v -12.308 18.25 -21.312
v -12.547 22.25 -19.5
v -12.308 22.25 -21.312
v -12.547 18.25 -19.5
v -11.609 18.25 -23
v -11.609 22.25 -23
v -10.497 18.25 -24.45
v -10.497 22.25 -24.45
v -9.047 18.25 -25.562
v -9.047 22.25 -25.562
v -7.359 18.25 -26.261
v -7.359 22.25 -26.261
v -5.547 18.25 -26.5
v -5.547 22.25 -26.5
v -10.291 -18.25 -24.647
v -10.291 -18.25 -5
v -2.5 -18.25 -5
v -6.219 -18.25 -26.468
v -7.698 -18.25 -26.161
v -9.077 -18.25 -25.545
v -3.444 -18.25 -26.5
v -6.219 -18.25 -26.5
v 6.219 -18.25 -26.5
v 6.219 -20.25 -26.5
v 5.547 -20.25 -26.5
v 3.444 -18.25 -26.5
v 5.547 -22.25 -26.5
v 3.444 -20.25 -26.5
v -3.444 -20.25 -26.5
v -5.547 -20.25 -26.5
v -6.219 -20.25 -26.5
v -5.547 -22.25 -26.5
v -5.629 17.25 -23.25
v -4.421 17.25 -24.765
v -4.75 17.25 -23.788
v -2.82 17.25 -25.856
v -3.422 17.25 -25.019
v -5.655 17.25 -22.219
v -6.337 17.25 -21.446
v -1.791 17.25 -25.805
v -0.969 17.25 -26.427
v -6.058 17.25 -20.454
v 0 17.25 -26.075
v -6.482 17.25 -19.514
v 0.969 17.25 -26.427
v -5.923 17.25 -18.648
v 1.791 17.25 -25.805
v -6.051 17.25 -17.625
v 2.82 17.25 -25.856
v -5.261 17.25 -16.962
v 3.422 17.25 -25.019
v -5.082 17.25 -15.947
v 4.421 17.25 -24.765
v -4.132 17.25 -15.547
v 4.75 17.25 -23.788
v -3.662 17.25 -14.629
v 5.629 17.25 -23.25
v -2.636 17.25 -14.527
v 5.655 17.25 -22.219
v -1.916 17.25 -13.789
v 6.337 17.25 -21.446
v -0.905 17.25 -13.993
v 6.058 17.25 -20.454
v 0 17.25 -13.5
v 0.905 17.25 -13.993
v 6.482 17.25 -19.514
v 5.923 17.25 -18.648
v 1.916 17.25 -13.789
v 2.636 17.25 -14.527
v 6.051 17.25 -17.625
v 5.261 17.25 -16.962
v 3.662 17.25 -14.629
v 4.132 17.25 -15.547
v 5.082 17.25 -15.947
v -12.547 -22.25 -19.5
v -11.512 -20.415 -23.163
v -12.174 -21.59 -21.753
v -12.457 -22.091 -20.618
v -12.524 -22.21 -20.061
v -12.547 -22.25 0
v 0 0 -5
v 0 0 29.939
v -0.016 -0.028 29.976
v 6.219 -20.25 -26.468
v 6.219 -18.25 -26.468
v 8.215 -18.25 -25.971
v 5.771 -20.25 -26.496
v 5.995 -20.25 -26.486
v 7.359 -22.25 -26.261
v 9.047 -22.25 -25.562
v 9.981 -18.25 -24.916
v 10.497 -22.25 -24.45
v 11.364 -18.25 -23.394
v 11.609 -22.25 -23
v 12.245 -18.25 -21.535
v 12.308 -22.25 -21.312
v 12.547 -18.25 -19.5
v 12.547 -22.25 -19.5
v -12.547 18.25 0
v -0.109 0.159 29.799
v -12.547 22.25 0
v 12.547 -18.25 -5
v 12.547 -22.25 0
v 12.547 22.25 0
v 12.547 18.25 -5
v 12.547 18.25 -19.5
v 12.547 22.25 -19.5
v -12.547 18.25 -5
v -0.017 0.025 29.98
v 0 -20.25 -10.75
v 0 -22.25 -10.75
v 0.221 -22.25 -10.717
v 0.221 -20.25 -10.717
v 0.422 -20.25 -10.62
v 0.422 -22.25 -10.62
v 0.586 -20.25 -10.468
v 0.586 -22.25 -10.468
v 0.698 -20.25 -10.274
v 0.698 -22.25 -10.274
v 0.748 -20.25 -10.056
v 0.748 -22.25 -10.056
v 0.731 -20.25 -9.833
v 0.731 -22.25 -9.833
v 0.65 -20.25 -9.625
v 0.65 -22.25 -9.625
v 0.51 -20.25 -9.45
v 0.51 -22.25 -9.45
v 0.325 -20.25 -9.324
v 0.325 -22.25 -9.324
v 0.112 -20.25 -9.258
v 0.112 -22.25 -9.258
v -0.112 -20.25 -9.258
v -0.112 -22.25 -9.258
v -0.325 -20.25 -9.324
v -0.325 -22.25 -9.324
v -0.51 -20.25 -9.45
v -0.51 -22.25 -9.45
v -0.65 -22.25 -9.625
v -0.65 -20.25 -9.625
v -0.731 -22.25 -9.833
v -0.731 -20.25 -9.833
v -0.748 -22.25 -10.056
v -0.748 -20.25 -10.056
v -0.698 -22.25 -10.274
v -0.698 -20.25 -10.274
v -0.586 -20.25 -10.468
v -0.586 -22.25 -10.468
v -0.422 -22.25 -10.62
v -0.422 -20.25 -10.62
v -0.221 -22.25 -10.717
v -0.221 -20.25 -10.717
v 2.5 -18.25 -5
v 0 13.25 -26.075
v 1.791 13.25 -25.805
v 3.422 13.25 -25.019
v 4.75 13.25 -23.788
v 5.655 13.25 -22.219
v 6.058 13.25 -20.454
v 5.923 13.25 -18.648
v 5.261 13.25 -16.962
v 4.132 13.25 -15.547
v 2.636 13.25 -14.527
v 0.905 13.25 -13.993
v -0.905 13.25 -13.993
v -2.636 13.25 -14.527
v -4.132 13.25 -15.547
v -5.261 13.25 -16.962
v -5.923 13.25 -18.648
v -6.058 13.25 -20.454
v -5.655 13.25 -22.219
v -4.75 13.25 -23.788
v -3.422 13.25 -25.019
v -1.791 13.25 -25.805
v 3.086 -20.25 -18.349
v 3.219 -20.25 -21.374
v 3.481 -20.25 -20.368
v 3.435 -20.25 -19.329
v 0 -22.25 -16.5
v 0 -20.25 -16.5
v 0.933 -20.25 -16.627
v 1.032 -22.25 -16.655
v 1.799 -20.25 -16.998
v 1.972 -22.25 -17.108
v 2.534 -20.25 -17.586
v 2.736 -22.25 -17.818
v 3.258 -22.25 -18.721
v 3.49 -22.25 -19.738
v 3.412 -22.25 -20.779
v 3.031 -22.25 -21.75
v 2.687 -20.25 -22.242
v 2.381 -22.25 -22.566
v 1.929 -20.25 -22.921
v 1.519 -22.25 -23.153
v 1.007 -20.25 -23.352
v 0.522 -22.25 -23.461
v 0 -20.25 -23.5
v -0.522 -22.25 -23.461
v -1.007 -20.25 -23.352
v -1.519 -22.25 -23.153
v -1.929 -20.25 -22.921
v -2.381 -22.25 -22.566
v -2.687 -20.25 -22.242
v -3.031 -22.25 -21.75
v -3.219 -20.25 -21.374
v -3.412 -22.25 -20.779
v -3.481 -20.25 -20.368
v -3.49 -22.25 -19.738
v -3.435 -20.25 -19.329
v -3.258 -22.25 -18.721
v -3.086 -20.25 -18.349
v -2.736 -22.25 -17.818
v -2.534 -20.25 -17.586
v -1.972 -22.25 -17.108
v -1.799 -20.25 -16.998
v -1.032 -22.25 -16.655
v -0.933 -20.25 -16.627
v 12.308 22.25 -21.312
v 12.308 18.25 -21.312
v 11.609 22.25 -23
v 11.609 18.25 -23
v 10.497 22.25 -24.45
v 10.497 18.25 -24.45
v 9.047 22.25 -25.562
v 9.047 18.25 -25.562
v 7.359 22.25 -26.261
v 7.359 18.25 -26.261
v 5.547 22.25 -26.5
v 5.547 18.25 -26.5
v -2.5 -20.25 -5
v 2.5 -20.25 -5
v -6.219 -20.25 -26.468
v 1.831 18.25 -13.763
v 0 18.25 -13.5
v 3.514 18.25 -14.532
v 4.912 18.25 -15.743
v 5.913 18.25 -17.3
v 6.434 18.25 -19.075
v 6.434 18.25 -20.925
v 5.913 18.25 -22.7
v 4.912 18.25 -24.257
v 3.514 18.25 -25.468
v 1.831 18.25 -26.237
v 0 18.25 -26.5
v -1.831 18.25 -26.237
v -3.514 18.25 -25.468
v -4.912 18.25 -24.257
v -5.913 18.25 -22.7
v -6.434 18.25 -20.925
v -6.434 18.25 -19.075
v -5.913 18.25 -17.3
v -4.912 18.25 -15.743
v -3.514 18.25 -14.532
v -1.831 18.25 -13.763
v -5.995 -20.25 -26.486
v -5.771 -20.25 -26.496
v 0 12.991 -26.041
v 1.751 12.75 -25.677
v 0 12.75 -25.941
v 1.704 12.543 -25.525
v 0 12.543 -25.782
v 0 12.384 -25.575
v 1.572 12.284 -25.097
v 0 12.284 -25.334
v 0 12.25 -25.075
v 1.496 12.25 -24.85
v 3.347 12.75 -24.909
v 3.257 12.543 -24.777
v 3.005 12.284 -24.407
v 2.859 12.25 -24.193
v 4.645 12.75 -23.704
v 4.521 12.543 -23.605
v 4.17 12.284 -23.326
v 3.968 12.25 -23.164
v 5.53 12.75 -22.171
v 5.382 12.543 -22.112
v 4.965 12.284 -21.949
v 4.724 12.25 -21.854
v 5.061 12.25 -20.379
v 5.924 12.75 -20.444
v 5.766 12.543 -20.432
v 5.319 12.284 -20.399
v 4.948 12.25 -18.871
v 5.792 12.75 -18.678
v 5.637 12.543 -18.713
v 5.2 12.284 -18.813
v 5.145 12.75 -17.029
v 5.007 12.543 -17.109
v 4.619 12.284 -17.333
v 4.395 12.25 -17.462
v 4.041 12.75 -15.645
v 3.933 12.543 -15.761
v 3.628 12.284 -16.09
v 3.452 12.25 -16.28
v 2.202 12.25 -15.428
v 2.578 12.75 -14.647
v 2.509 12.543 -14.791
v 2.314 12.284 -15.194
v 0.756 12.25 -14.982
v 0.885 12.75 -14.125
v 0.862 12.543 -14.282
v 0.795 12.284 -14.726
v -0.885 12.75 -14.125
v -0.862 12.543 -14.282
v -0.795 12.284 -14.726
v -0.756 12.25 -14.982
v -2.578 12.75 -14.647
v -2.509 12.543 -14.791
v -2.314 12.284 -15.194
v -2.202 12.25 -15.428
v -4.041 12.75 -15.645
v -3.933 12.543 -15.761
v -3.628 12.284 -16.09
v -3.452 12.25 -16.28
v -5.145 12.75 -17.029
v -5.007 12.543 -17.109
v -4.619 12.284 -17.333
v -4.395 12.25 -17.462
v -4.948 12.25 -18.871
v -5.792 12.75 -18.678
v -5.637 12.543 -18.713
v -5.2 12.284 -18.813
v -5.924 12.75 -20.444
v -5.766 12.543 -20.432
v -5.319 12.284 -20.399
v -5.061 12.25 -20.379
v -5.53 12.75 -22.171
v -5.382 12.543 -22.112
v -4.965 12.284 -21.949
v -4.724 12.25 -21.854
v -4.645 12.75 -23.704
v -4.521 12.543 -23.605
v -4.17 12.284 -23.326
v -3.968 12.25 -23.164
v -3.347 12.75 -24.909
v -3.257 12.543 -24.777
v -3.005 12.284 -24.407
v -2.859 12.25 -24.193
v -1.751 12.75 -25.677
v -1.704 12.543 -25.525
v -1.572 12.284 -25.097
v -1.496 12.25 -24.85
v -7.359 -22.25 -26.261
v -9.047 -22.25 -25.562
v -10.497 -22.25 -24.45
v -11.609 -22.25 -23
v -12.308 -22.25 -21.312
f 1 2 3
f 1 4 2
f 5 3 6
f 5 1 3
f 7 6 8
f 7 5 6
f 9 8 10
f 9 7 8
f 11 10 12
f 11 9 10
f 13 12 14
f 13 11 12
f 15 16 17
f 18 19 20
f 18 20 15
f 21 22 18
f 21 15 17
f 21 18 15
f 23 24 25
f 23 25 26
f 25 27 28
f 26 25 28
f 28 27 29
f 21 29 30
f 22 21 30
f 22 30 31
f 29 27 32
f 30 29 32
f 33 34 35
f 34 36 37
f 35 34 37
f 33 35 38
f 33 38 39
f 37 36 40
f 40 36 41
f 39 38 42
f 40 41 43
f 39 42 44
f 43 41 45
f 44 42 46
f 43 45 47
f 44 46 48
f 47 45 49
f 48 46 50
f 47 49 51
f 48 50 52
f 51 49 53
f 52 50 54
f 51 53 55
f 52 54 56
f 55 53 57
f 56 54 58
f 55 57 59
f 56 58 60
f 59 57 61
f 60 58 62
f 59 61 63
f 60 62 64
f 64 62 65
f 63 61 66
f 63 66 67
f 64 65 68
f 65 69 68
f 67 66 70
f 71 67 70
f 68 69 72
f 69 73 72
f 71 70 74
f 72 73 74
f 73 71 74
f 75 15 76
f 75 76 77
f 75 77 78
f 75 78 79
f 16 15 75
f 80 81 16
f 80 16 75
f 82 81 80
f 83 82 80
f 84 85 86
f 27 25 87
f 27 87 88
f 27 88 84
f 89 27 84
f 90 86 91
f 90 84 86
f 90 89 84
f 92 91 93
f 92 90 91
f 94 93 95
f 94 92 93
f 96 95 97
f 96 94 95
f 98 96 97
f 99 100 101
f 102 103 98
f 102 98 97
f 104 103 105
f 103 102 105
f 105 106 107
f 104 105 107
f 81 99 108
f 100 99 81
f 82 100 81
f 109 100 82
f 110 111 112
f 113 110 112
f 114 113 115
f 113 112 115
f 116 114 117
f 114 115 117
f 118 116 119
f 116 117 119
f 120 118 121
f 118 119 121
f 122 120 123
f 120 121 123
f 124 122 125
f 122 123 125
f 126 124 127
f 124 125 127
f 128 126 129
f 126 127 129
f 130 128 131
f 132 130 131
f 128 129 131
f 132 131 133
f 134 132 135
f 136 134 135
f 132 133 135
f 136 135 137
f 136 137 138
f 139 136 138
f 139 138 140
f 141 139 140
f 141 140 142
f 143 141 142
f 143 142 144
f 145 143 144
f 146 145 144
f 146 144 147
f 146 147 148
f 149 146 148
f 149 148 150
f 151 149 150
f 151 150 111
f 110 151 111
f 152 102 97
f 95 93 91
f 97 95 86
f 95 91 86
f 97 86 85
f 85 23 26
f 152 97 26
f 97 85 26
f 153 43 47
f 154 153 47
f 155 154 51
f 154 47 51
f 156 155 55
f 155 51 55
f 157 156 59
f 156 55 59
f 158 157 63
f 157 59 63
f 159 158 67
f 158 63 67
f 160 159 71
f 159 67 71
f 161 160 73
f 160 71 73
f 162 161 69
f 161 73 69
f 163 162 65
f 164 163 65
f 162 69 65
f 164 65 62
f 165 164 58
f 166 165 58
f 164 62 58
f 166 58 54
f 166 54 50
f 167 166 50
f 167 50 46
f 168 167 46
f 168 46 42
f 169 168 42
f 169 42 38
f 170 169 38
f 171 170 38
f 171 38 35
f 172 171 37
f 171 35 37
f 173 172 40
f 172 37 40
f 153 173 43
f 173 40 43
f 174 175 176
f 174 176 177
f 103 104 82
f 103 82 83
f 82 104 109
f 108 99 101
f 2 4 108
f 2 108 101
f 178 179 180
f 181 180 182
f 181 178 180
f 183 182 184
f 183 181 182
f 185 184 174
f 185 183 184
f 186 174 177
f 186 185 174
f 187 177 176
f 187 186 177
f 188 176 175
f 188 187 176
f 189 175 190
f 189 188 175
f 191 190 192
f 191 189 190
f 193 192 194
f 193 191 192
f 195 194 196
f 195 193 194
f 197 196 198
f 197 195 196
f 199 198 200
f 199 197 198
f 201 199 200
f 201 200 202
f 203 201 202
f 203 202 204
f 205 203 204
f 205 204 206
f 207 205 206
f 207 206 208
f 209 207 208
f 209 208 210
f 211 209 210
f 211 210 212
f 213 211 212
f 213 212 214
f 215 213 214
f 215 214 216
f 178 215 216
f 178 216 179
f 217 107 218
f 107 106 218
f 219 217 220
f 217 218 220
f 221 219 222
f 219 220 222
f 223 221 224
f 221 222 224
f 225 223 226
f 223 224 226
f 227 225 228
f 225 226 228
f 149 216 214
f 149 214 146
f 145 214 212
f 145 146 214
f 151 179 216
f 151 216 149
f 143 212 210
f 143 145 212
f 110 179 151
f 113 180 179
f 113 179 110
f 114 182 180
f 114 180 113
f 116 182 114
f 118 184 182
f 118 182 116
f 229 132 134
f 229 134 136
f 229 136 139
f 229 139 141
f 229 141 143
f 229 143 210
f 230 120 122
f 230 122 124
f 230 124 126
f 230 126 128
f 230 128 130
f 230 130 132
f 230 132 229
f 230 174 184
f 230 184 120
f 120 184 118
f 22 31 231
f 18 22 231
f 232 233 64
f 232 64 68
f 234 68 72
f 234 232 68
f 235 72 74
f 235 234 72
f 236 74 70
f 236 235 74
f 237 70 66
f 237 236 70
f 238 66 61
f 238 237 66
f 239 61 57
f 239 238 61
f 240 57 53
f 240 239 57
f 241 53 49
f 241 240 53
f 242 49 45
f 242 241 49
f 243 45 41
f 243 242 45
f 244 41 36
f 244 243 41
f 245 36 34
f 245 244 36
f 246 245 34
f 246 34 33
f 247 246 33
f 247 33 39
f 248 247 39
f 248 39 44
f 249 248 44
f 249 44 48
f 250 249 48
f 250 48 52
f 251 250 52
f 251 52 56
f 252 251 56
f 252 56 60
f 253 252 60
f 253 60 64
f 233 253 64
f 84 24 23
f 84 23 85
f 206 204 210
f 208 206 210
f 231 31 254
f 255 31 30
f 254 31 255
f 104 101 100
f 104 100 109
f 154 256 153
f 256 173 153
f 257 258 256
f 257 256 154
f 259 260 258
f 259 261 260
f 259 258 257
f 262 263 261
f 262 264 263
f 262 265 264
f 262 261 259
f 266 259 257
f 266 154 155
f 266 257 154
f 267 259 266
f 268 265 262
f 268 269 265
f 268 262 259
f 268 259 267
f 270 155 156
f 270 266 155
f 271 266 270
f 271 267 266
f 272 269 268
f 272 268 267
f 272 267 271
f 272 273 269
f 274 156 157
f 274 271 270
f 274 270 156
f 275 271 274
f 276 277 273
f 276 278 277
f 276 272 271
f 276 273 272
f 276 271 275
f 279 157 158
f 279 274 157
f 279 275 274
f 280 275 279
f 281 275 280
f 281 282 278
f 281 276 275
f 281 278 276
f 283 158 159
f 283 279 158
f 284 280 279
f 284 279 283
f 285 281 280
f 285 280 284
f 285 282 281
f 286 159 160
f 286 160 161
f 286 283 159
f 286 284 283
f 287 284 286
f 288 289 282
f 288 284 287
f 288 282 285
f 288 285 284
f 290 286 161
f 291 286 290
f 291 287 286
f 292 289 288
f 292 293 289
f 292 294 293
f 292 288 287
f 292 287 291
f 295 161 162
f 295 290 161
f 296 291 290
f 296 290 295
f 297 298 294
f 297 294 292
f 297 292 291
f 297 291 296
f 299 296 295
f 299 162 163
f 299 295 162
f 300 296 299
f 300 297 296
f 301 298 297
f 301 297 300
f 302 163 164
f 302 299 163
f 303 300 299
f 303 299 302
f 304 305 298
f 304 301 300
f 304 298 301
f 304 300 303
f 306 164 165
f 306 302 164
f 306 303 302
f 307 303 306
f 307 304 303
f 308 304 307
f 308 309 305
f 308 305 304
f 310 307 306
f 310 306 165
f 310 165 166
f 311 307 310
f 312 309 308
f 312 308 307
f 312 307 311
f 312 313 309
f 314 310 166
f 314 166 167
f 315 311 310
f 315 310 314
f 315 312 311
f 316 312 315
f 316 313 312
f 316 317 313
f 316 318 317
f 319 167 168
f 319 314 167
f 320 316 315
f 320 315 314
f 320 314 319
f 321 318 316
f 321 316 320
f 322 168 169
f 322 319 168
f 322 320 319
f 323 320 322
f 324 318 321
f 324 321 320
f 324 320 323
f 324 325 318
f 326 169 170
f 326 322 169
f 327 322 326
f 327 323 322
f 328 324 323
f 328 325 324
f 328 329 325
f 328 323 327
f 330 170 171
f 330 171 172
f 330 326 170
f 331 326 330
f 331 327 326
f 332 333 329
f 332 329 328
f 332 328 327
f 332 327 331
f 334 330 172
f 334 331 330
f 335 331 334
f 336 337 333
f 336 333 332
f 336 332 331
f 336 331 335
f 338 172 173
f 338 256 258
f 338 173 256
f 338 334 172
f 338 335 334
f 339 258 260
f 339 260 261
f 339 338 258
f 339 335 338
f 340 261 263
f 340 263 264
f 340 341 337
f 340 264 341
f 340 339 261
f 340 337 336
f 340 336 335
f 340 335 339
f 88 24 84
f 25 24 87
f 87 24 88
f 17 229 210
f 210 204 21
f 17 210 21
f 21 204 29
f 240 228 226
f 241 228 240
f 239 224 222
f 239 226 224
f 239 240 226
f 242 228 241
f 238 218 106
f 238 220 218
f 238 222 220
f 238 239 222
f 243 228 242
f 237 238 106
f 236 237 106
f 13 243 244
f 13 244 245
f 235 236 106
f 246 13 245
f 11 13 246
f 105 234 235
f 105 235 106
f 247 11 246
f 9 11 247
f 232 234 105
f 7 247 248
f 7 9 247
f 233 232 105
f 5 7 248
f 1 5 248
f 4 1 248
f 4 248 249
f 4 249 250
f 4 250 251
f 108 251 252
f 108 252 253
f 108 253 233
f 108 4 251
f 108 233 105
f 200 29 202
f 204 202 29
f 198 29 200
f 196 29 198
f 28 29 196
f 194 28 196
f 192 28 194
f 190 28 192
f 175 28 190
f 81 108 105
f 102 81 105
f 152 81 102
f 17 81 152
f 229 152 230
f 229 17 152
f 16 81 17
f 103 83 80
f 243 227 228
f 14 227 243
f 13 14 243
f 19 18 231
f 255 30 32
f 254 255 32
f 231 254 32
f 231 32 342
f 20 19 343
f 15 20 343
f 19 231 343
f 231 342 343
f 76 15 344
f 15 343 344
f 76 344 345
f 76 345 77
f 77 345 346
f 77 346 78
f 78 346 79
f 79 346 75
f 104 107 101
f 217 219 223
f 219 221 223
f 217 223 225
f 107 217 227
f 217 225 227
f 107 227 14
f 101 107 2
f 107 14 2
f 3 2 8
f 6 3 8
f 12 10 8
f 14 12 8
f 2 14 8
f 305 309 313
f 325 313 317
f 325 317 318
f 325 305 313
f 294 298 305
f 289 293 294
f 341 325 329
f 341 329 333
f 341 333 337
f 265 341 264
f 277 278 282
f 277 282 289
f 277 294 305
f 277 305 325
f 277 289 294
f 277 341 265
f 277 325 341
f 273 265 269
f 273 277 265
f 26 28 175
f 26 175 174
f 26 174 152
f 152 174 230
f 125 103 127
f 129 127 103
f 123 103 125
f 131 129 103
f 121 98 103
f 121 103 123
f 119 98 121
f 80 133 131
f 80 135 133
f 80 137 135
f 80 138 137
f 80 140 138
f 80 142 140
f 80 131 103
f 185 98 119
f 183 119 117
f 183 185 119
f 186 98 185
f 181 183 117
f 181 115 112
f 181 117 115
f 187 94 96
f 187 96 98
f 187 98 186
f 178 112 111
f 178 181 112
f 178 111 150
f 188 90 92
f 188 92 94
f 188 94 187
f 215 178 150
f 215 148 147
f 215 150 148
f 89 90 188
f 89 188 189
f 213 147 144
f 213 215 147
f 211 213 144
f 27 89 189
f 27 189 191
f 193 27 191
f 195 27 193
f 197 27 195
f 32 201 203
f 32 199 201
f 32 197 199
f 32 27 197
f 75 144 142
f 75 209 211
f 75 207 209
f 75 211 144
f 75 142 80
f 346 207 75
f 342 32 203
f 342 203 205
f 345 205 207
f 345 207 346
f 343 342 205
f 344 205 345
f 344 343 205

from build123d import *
from OCP.BRepFilletAPI import BRepFilletAPI_MakeChamfer

# Parameters (mm, degrees)
SKETCH4_W                = 12.46
SKETCH4_H                = 17.25
BOSS_EXTRUDE3_DEPTH      = 6
BOSS_EXTRUDE6_DEPTH      = 7.3
BOSS_EXTRUDE6_DEPTH_BACK = 17.25
SKETCH8_R                = 12.546781182
SKETCH8_R_2              = 11.15
BOSS_EXTRUDE4_DEPTH      = 17.25
SKETCH6_R                = 2
CUT_EXTRUDE1_DEPTH       = 5
CHAMFER1_SIZE            = 0.5
CHAMFER1_SIZE_2          = 0.866025404
SKETCH10_W               = 12.46
SKETCH10_H               = 23.7
CUT_EXTRUDE3_DEPTH       = 17.25
CUT_EXTRUDE4_REACH       = 43.938
SKETCH11_W               = 5
SKETCH11_H               = 3
BOSS_EXTRUDE7_START      = -7.3
BOSS_EXTRUDE7_DEPTH      = 7.3
BOSS_EXTRUDE9_START      = 10
BOSS_EXTRUDE9_DEPTH      = 10
BOSS_EXTRUDE10_DEPTH     = 25.093562364
SKETCH18_W               = 21.5
SKETCH18_H               = 12.438292938
CUT_EXTRUDE5_DEPTH       = 2
CUT_EXTRUDE6_DEPTH       = 58.154608998
CUT_EXTRUDE6_DEPTH_BACK  = 58.154608998
SKETCH19_R               = 3.5
FILLET1_R                = 7
CUT_EXTRUDE7_DEPTH       = 55.97840444
CUT_EXTRUDE7_DEPTH_BACK  = 55.97840444
SKETCH20_W               = 25.093562364
SKETCH20_H               = 36.096781182
BOSS_EXTRUDE11_DEPTH     = 44.5
CUT_EXTRUDE8_DEPTH       = 40.401576339
CUT_EXTRUDE8_DEPTH_BACK  = 40.401576339
CUT_EXTRUDE9_DEPTH       = 40.401576339
CUT_EXTRUDE9_DEPTH_BACK  = 40.401576339
SKETCH24_R               = 6.5
BOSS_EXTRUDE12_DEPTH     = 5
SKETCH25_R               = 6.075
BOSS_EXTRUDE13_DEPTH     = 5
FILLET2_R                = 1
BOSS_EXTRUDE14_DEPTH     = 2
CUT_EXTRUDE10_REACH      = 57.104
SKETCH27_R               = 0.75


with BuildPart() as part:
    # Sketch4 → Boss-Extrude3 (new body)
    with BuildSketch(Plane.XY):
        with Locations((0, -1.35)):
            Rectangle(SKETCH4_W, SKETCH4_H)
    extrude(amount=BOSS_EXTRUDE3_DEPTH)



with BuildPart() as body_2:
    # Sketch8 → Boss-Extrude6 (new, two sides: drawn at the far end of the back side and taken through both)
    with BuildSketch(Plane(origin=(0, -9.975, 0), x_dir=(-1, 0, 0), z_dir=(0, -1, 0)).offset(-BOSS_EXTRUDE6_DEPTH_BACK)):
        with Locations(Location((0, -23.55, 0), (0, 0, 90))):
            Circle(SKETCH8_R)
        with Locations(Location((0, -23.55, 0), (0, 0, 90))):
            Circle(SKETCH8_R_2, mode=Mode.SUBTRACT)
    extrude(amount=BOSS_EXTRUDE6_DEPTH + BOSS_EXTRUDE6_DEPTH_BACK)


with BuildPart() as part_1:
    add(part.part)

    add(body_2.part)  # Boss-Extrude4 merges body 2
    # Sketch5 → Boss-Extrude4 (add)
    with BuildSketch(Plane(origin=(0, 7.275, 0), x_dir=(1, 0, 0), z_dir=(0, 1, 0))):
        with BuildLine():
            Line((12.546781182, -23.55), (12.546781182, 0))
            Line((12.546781182, 0), (6.23, 0))
            Line((6.23, 0), (6.23, -29.7))
            Line((6.23, -29.7), (-6.23, -29.7))
            Line((-6.23, -29.7), (-6.23, 0))
            Line((-6.23, 0), (-12.546781182, 0))
            Line((-12.546781182, 0), (-12.546781182, -23.55))
            ThreePointArc((-12.546781182, -23.55), (0, -36.096781182), (12.546781182, -23.55))
        make_face()
    extrude(amount=-BOSS_EXTRUDE4_DEPTH)

    # Sketch6 → Cut-Extrude1 (cut)
    with BuildSketch(Plane(origin=(0, 7.275, 0), x_dir=(1, 0, 0), z_dir=(0, 1, 0))):
        with Locations(Location((0, -3.5, 0), (0, 0, 270))):
            Circle(SKETCH6_R)
        with Locations(Location((0, -32.2, 0), (0, 0, 270))):
            Circle(SKETCH6_R)
    extrude(amount=-CUT_EXTRUDE1_DEPTH, mode=Mode.SUBTRACT)

    # Chamfer1
    chamfer1_edges_1 = [part_1.edges().sort_by_distance(p)[0] for p in [
        (0, 7.275, 1.5),
    ]]
    chamfer1_side_1 = [part_1.faces().sort_by_distance(p)[0] for p in [
        (0, 7.275, 1.49),
    ]]
    chamfer1_edges_2 = [part_1.edges().sort_by_distance(p)[0] for p in [
        (0, 7.275, 30.2),
    ]]
    chamfer1_side_2 = [part_1.faces().sort_by_distance(p)[0] for p in [
        (0, 7.275, 30.19),
    ]]
    chamfer1 = BRepFilletAPI_MakeChamfer(part_1.part.solid().wrapped)
    for e in chamfer1_edges_1:
        chamfer1.Add(CHAMFER1_SIZE - 0.0001, CHAMFER1_SIZE_2 - 0.0001, e.wrapped, chamfer1_side_1[0].wrapped)
    for e in chamfer1_edges_2:
        chamfer1.Add(CHAMFER1_SIZE - 0.0001, CHAMFER1_SIZE_2 - 0.0001, e.wrapped, chamfer1_side_2[0].wrapped)
    add(Compound.cast(chamfer1.Shape()), mode=Mode.REPLACE)  # a hair under: the kernel refuses the full size

    # Sketch10 → Cut-Extrude3 (cut)
    with BuildSketch(Plane(origin=(0, 7.275, 0), x_dir=(1, 0, 0), z_dir=(0, 1, 0))):
        with Locations((0, -17.85)):
            Rectangle(SKETCH10_W, SKETCH10_H)
    extrude(amount=-CUT_EXTRUDE3_DEPTH, mode=Mode.SUBTRACT)

    # Sketch11 → Cut-Extrude4 (cut, up to next)
    with BuildSketch(Plane.XY.offset(36.096781182), mode=Mode.PRIVATE) as cut_extrude4_sk1:
        with Locations((0, -8.475)):
            Rectangle(SKETCH11_W, SKETCH11_H)
    cut_extrude4_tool1 = extrude(cut_extrude4_sk1.sketch, amount=-CUT_EXTRUDE4_REACH, mode=Mode.PRIVATE) & part_1.part
    add(cut_extrude4_tool1.solids().sort_by_distance((0, -8.475, 36.096781))[0], mode=Mode.SUBTRACT)

    # Sketch13 → Boss-Extrude7 (add)
    with BuildSketch(Plane.XZ.offset(17.275).offset(BOSS_EXTRUDE7_START)):
        with BuildLine():
            Line((-12.546781182, 23.55), (-12.546781182, 0))
            Line((-12.546781182, 0), (12.546781182, 0))
            Line((12.546781182, 0), (12.546781182, 23.55))
            ThreePointArc((12.546781182, 23.55), (0, 11.003218818), (-12.546781182, 23.55))
        make_face()
    extrude(amount=BOSS_EXTRUDE7_DEPTH)

    # Sketch15 → Boss-Extrude9 (add)
    with BuildSketch(Plane(origin=(0, 7.275, 0), x_dir=(1, 0, 0), z_dir=(0, 1, 0)).offset(BOSS_EXTRUDE9_START)):
        with BuildLine():
            Line((-12.546781182, 0), (12.546781182, 0))
            Line((12.546781182, 0), (12.546781182, -23.55))
            ThreePointArc((12.546781182, -23.55), (0, -36.096781182), (-12.546781182, -23.55))
            Line((-12.546781182, -23.55), (-12.546781182, 0))
        make_face()
        with BuildLine():
            Line((-6.23, -0.8), (6.23, -0.8))
            Line((6.23, -0.8), (6.23, -33.5))
            ThreePointArc((6.23, -33.5), (5.937106781, -34.207106781), (5.23, -34.5))
            Line((5.23, -34.5), (-5.23, -34.5))
            ThreePointArc((-5.23, -34.5), (-5.937106781, -34.207106781), (-6.23, -33.5))
            Line((-6.23, -33.5), (-6.23, -0.8))
        make_face(mode=Mode.SUBTRACT)
    extrude(amount=-BOSS_EXTRUDE9_DEPTH)

    # Sketch17 → Boss-Extrude10 (add)
    with BuildSketch(Plane(origin=(-12.546781182, 4.728218818, 0), x_dir=(0, -1, 0), z_dir=(1, 0, 0))):
        Polygon((26.978218818, 26.5), (26.978218818, 0), (-17.521781182, 0), (-17.521781182, 26.5), (-13.521781182, 26.5), (-13.521781182, 5), (22.978218818, 5), (22.978218818, 26.5), align=None)
    extrude(amount=BOSS_EXTRUDE10_DEPTH)

    # Sketch18 → Cut-Extrude5 (cut)
    with BuildSketch(Plane.ZX.offset(-18.25)):
        with Locations((-15.75, 0)):
            Rectangle(SKETCH18_W, SKETCH18_H)
    extrude(amount=-CUT_EXTRUDE5_DEPTH, mode=Mode.SUBTRACT)

    # Sketch19 → Cut-Extrude6 (cut, two sides: drawn at the far end of the back side and taken through both)
    with BuildSketch(Plane.ZX.offset(-20.25).offset(-CUT_EXTRUDE6_DEPTH_BACK)):
        with Locations((-20, 0)):
            Circle(SKETCH19_R)
    extrude(amount=CUT_EXTRUDE6_DEPTH + CUT_EXTRUDE6_DEPTH_BACK, mode=Mode.SUBTRACT)

    # Fillet1
    fillet1_edges = [part_1.edges().sort_by_distance(p)[0] for p in [
        (12.546781182, -20.25, -26.5),
        (-12.546781182, -20.25, -26.5),
        (-12.546781182, 20.25, -26.5),
        (12.546781182, 20.25, -26.5),
    ]]
    fillet(fillet1_edges, radius=FILLET1_R)

    # Sketch20 → Cut-Extrude7 (cut, two sides: drawn at the far end of the back side and taken through both)
    with BuildSketch(Plane(origin=(0, 17.275, 0), x_dir=(1, 0, 0), z_dir=(0, 1, 0)).offset(-CUT_EXTRUDE7_DEPTH_BACK)):
        with Locations((0, -18.048390591)):
            Rectangle(SKETCH20_W, SKETCH20_H)
    extrude(amount=CUT_EXTRUDE7_DEPTH + CUT_EXTRUDE7_DEPTH_BACK, mode=Mode.SUBTRACT)

    # Sketch21 → Boss-Extrude11 (add)
    with BuildSketch(Plane(origin=(0, 22.25, 0), x_dir=(1, 0, 0), z_dir=(0, 1, 0))):
        Polygon((12.546781182, 0), (-0.025415104, -30), (-12.546781182, 0), align=None)
    extrude(amount=-BOSS_EXTRUDE11_DEPTH)

    # Sketch22 → Cut-Extrude8 (cut, two sides: drawn at the far end of the back side and taken through both)
    with BuildSketch(Plane(origin=(0, 0, 0), x_dir=(0, 0, -1), z_dir=(1, 0, 0)).offset(-CUT_EXTRUDE8_DEPTH_BACK)):
        Polygon((0, 22.25), (-30, 0.01), (-30, 22.25), align=None)
        Polygon((0, -22.25), (-30, -22.25), (-30, -0.01), align=None)
    extrude(amount=CUT_EXTRUDE8_DEPTH + CUT_EXTRUDE8_DEPTH_BACK, mode=Mode.SUBTRACT)

    # Sketch23 → Cut-Extrude9 (cut, two sides: drawn at the far end of the back side and taken through both)
    with BuildSketch(Plane(origin=(0, 0, 0), x_dir=(-1, 0, 0), z_dir=(0, 0, -1)).offset(-CUT_EXTRUDE9_DEPTH_BACK)):
        Polygon((12.546781182, 18.25), (0, 0), (12.546781182, -22.25), align=None)
    extrude(amount=CUT_EXTRUDE9_DEPTH + CUT_EXTRUDE9_DEPTH_BACK, mode=Mode.SUBTRACT)

    # Sketch24 → Boss-Extrude12 (add)
    with BuildSketch(Plane(origin=(0, 22.25, 0), x_dir=(1, 0, 0), z_dir=(0, 1, 0))):
        with Locations(Location((0, 20, 0), (0, 0, 270))):
            Circle(SKETCH24_R)
    extrude(amount=-BOSS_EXTRUDE12_DEPTH)

    # Sketch25 → Boss-Extrude13 (add)
    with BuildSketch(Plane.XZ.offset(-17.25)):
        with Locations(Location((0, -20, 0), (0, 0, 270))):
            Circle(SKETCH25_R)
    extrude(amount=BOSS_EXTRUDE13_DEPTH)

    # Fillet2
    fillet2_edges = [part_1.edges().sort_by_distance(p)[0] for p in [
        (0, 12.25, -13.925),
    ]]
    fillet(fillet2_edges, radius=FILLET2_R)

    # Sketch26 → Boss-Extrude14 (add)
    with BuildSketch(Plane(origin=(0, -20.25, 0), x_dir=(1, 0, 0), z_dir=(0, 1, 0))):
        Polygon((-6.219146469, 5), (-2.5, 5), (-3.1585, 20), (-3.44385, 26.5), (-6.219146469, 26.5), align=None)
        Polygon((3.1585, 20), (3.44385, 26.5), (6.219146469, 26.5), (6.219146469, 5), (2.5, 5), align=None)
    extrude(amount=BOSS_EXTRUDE14_DEPTH)

    # Sketch27 → Cut-Extrude10 (cut, up to next)
    with BuildSketch(Plane.XZ.offset(22.25), mode=Mode.PRIVATE) as cut_extrude10_sk1:
        with Locations(Location((0, -10, 0), (0, 0, 270))):
            Circle(SKETCH27_R)
    cut_extrude10_tool1 = extrude(cut_extrude10_sk1.sketch, amount=-CUT_EXTRUDE10_REACH, mode=Mode.PRIVATE) & part_1.part
    add(cut_extrude10_tool1.solids().sort_by_distance((0, -22.25, -10))[0], mode=Mode.SUBTRACT)


solid = part_1.part
